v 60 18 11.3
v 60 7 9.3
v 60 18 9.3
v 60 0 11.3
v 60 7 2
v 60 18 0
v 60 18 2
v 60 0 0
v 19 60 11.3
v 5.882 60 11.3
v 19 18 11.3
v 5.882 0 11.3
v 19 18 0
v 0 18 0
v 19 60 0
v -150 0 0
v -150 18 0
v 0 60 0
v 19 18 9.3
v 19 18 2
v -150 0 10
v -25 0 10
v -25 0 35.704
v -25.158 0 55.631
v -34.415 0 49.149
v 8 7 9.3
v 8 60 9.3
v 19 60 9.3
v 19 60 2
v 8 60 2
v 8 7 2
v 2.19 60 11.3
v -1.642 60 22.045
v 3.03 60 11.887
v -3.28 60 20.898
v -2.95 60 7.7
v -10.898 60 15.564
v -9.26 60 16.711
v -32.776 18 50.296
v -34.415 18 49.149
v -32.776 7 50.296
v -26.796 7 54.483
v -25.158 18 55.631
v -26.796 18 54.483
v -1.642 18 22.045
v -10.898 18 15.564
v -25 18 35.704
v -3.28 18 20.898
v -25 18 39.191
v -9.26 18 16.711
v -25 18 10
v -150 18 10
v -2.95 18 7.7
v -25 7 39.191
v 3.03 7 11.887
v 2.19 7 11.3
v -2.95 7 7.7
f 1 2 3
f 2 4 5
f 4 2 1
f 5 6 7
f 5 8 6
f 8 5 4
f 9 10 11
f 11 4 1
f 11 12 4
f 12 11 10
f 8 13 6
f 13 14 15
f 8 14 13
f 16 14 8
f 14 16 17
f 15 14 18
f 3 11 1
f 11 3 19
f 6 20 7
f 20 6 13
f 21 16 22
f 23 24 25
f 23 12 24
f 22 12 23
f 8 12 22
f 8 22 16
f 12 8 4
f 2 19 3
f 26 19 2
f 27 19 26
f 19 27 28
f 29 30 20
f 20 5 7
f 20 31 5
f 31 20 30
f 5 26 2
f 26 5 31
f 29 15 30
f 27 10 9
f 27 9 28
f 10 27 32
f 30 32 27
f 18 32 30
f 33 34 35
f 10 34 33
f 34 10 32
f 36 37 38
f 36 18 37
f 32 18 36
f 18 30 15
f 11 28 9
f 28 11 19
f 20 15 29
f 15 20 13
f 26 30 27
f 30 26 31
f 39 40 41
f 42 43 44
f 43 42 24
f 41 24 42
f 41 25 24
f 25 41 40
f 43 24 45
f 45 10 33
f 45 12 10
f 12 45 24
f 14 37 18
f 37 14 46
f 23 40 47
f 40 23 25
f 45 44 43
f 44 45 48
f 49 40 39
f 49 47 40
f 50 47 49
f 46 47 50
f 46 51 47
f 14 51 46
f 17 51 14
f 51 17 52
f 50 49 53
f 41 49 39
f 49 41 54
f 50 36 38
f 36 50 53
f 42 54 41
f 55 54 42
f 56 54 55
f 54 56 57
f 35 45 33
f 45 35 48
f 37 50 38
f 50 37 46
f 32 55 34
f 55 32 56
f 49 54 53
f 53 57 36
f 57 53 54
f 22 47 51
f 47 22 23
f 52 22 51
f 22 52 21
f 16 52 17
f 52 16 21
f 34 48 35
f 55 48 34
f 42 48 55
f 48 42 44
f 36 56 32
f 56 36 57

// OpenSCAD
/* ------------------------------------------------
 SurfaceConstellations Project 
 University College London

 CROSS-DEVICE BRACKETS FOR 3D PRINT

 Published as academic paper at ACM CHI 2018, Montreal.
 Please cite as: 
 Nicolai Marquardt, Frederik Brudy, Can Liu, Benedikt Bengler, 
 and Christian Holz (2018). SurfaceConstellations: A Modular 
 Hardware Platform for Ad-Hoc Reconfigurable Cross-Device 
 Workspaces. In Proceedings of ACM CHI 2018.
 

 MIT License

 Copyright (c) 2018 Nicolai Marquardt, Frederik Brudy, Can Liu, 
 Benedikt Bengler and Christian Holz

 Permission is hereby granted, free of charge, to any person obtaining a copy
 of this software and associated documentation files (the "Software"), to deal
 in the Software without restriction, including without limitation the rights
 to use, copy, modify, merge, publish, distribute, sublicense, and/or sell
 copies of the Software, and to permit persons to whom the Software is
 furnished to do so, subject to the following conditions:

 The above copyright notice and this permission notice shall be included in all
 copies or substantial portions of the Software.

 THE SOFTWARE IS PROVIDED "AS IS", WITHOUT WARRANTY OF ANY KIND, EXPRESS OR
 IMPLIED, INCLUDING BUT NOT LIMITED TO THE WARRANTIES OF MERCHANTABILITY,
 FITNESS FOR A PARTICULAR PURPOSE AND NONINFRINGEMENT. IN NO EVENT SHALL THE
 AUTHORS OR COPYRIGHT HOLDERS BE LIABLE FOR ANY CLAIM, DAMAGES OR OTHER
 LIABILITY, WHETHER IN AN ACTION OF CONTRACT, TORT OR OTHERWISE, ARISING FROM,
 OUT OF OR IN CONNECTION WITH THE SOFTWARE OR THE USE OR OTHER DEALINGS IN THE
 SOFTWARE.


 
 Revision history:
 01: basic brackets
 02: added angles, support extensions
 03: openings, mirroring
 04: optimizations, first 3D test prints
 05: thinner design, second 3D test prints
 06: cut-out design change
 07: Added variable X/Y thickness values
 08: Added capacitive link
 09: Simplified code, third 3D test prints
 10: First capacitive link test prints
 11: Capacitive link improvements
 12: Mirroring improvements
 13: Extra extension support
 14: Fixed bugs with mirroring
 15: Support extension corrections
 16: Negative shell corrections
 17: CHI version
 18: Wide extension support
 19: GitHub release and MIT licence
 
 ------------------------------------------------ */
 




// /////////////////////////////////////////////////
/* [General] */
// /////////////////////////////////////////////////

//Number of brackets (all offset in 90 degrees)
brackets=2;//[1:4]

//Mirror at the x-axis 
mirror_X=0;

//Mirror at the y-axis 
mirror_Y=0;



// /////////////////////////////////////////////////
/* [Border and layers] */
// /////////////////////////////////////////////////

//Thickness of the outer border
border_width_X=7;//[4:20]
border_width_Y=8;//[4:20]

//Tablet cover width
// iPad Air 2     = 11mm
// Surface Pro 2  = 18mm
cover_width       = 11;//[4:20]

//Thickness of the top and bottom layer
layer_thickness=2.0;//[2:10]

//Thickness of the device (e.g., Tablet)
// iPad Air 1     = 7.3mm
// iPad Air 2     = 6.4mm
// iPad 3         = 9.5mm
// iPhone7        = 7.13mm
// Surface Pro 2  = 13.7mm
device_thickness=7.3;//[3:30]



//Tilt angle (around x axis)
angle=55;//[0:90]


//Length of each bracket side
length_X=60;//[20:100]
length_Y=60;//[20:100]

// Full height of the core layers
full_height = layer_thickness * 2 + device_thickness;



// /////////////////////////////////////////////////
/* [Stability extension] */
// /////////////////////////////////////////////////

//Stand extension length (to hold weight)
extension=150;//[0:200]

// Extensions support of the angled brackets
extension_support=25;
extension_thickness=10;
extension_support_width= cover_width + border_width_X;
extension_width= cover_width + border_width_X;

// Height of the ridge opening (for buttons, speaker)
ridge_height=0;//[0:10]



// /////////////////////////////////////////////////
/* [Capacitive Link (CL)] */
// /////////////////////////////////////////////////

// Width of the capacitive touch area
cl_touch_width = 12;//[1:10]

// Width of the capacitive core
cl_core_width = 8;//[1:10]

// ID position for capacitive links
cl_id_1=0.9;
cl_id_2=0.6;
cl_id_3=0;
cl_id_4=0;





//
// Override Presets
// (use for setting preset values)
//

// 1. Surface 2 pro, open bracket, long extension, 55 degree angle
//border_width_X     =7;
//border_width_Y     =1;
//extension          =150;
//length_X           =60;
//length_Y           =50;
//angle              =55;
//cover_width        =18;
//layer_thickness    =2.0;
//device_thickness   =13.1;


// 2. iPad Air 2, extension bracket, 50 degree angle
//border_width_X     =7;
//border_width_Y     =8;
//extension          =120;
//length_X           =60;
//length_Y           =60;
//angle              =50;
//cover_width        =11;
//layer_thickness    =2.0;
//device_thickness   = 6.4;








// /////////////////////////////////////////////////
// MAIN CODE
// /////////////////////////////////////////////////


// Run main build function
build();



// the main build method
module build(){
    
  //difference(){
  //    difference(){
  //      build_brackets();
  //      //build_device_shell();
  //    };
  //    build_capacitive_link();
  //}
  
  //build_capacitive_link();
  //build_brackets();
    
    difference(){
       build_brackets();
       build_device_shell_complete();
    };
}



// Construct capacitive link module
module build_capacitive_link(){
    
    color("red")
      cl_link(cl_id_1);
    
    color("red")
        rotate([0 ,angle,0])
          mirror([1,0,0])
            cl_link(cl_id_2);
    
    color("red")
        rotate([0 ,angle,0])
          mirror([1,0,0])
            mirror([0,1,0])
              cl_link(cl_id_3);
    
    color("red")
        mirror([0,1,0])
          cl_link(cl_id_4);   
}



// Construct single capacitive link module
module cl_link(id){
    if(id!=0){
        y=(border_width_X + cover_width + cl_core_width) + 
          (length_Y - (border_width_X + cover_width + cl_core_width)) * id;
        
        cube_offset = 2;
        translate([0,0,(cube_offset)])
        cube([cl_core_width, cl_core_width * 2, full_height-cube_offset]);
        
        translate([0,0,(layer_thickness+device_thickness)])
          cube([cl_core_width, y, layer_thickness]);
        
        cylinder_center_Y = (border_width_Y + cover_width + cl_touch_width/2.0);
        cylinder_center_X = y - cl_touch_width/2.0;
        
        translate([0,(y - cl_touch_width),(layer_thickness+device_thickness)])
          cube([cylinder_center_Y, cl_touch_width, layer_thickness]); 
        
        add_thickness = 0.3;
        
        translate([cylinder_center_Y,cylinder_center_X,(layer_thickness+device_thickness-add_thickness)])
          cylinder(layer_thickness + add_thickness, cl_touch_width/2.0, cl_touch_width/2.0, false);
    }
}




// Build the 'negative' model of the surface device, to cut it out
// of the surface brackets
module build_device_shell(){
    
    rotate([0 ,angle,0])
        rotate(90)
            translate([-200, border_width_Y, layer_thickness])
            cube([1000, 1000, device_thickness]);
    
    rotate([0 ,angle,0])
        rotate(90)
            translate([-200, border_width_Y + cover_width, layer_thickness])
            cube([1000, 1000, 1000]);
    
    rotate([0 ,angle,0])
        rotate(90)
            translate([-200, border_width_Y, (layer_thickness * 2 + device_thickness)])
            cube([1000, 1000, 1000]);
}



// Construct the device volumes 
module build_device_shell_complete(){
     mirror ([mirror_X,mirror_Y,0]) {
        
        for (count =[0:brackets - 1]){
            if(count == 0){
                    build_device();
            }
            else if(count == 1) {    
                rotate([0 ,angle,0])
                  mirror([1,0,0])
                    build_device();
            }
            else if(count == 2) {    
                rotate([0 ,angle,0])
                  mirror([1,0,0])
                   mirror([0,1,0])
                    build_device();
            }
            else if(count== 3){
                mirror([0,1,0])
                    build_device();
            }          
        }
    }
        
 
}

// Construct a single device volume
module build_device(){
    //translate([border_width_Y + layer_thickness * (angle / 90.0), border_width_X , layer_thickness])
    //        cube([1000, 1000, device_thickness]);
    
    
    translate([border_width_Y , border_width_X , layer_thickness])
            cube([1000, 1000, device_thickness]);
}




// Build the complete, multi-element bracket
module build_brackets()
{ 
        
    mirror ([mirror_X,mirror_Y,0]) {
        
        for (count =[0:brackets - 1]){
            if(count == 0){
                    build_bracket();
            }
            else if(count == 1) {    
                rotate([0 ,angle,0])
                  mirror([1,0,0])
                    build_bracket();
            }
            else if(count == 2) {    
                rotate([0 ,angle,0])
                  mirror([1,0,0])
                   mirror([0,1,0])
                    build_bracket();
            }
            else if(count== 3){
                mirror([0,1,0])
                    build_bracket();
            }          
        }
          
        
        // build the extension for additional weight support
        build_extension();

        
        // Build front for angled third-quadrant tilt
        if(brackets== 3){
             mirror([0,1,0])      
                cube([10, length_Y, (device_thickness + 2*layer_thickness)]);
        }
    }
}




// Add weight support at the back of the bracket
module build_extension(){    
    if(extension > 0){
        translate([-extension, 0, 0])
            cube([extension,  extension_width, extension_thickness]);
        
        if(brackets >2){
            translate([-extension, -(extension_width), 0])
                cube([extension,  extension_width, extension_thickness]);
        }       
    }
    
    if(extension_support > 0){
        difference(){
            translate([-extension_support, 0, 0])
                cube([extension_support,  extension_support_width, 800]);
            build_device_shell();
        }
        
        if(brackets >2){
            difference(){
                translate([-extension_support, -(extension_support_width), 0])
                    cube([extension_support,  extension_support_width, 800]);
                 build_device_shell();
            }
        }       
    }  
}



// Build a single L-shape bracket
module build_bracket(){
    slide_bracket(border_width_X, length_X);
    mirror([1,-1,0])    
        slide_bracket(border_width_Y, length_Y);
}


// Build a single slide-in element for the tablet
module slide_bracket(bw, length){  
    difference(){
        difference() {
            cube([length, bw+cover_width, (device_thickness + 2*layer_thickness)]);
            translate([0, bw, layer_thickness])
                cube([length, cover_width, device_thickness]);
        };
        translate([4, 0, (((device_thickness + 2*layer_thickness) - ridge_height) / 2.0)])
        cube([length - 8, bw,  ridge_height]);
    }      
}
